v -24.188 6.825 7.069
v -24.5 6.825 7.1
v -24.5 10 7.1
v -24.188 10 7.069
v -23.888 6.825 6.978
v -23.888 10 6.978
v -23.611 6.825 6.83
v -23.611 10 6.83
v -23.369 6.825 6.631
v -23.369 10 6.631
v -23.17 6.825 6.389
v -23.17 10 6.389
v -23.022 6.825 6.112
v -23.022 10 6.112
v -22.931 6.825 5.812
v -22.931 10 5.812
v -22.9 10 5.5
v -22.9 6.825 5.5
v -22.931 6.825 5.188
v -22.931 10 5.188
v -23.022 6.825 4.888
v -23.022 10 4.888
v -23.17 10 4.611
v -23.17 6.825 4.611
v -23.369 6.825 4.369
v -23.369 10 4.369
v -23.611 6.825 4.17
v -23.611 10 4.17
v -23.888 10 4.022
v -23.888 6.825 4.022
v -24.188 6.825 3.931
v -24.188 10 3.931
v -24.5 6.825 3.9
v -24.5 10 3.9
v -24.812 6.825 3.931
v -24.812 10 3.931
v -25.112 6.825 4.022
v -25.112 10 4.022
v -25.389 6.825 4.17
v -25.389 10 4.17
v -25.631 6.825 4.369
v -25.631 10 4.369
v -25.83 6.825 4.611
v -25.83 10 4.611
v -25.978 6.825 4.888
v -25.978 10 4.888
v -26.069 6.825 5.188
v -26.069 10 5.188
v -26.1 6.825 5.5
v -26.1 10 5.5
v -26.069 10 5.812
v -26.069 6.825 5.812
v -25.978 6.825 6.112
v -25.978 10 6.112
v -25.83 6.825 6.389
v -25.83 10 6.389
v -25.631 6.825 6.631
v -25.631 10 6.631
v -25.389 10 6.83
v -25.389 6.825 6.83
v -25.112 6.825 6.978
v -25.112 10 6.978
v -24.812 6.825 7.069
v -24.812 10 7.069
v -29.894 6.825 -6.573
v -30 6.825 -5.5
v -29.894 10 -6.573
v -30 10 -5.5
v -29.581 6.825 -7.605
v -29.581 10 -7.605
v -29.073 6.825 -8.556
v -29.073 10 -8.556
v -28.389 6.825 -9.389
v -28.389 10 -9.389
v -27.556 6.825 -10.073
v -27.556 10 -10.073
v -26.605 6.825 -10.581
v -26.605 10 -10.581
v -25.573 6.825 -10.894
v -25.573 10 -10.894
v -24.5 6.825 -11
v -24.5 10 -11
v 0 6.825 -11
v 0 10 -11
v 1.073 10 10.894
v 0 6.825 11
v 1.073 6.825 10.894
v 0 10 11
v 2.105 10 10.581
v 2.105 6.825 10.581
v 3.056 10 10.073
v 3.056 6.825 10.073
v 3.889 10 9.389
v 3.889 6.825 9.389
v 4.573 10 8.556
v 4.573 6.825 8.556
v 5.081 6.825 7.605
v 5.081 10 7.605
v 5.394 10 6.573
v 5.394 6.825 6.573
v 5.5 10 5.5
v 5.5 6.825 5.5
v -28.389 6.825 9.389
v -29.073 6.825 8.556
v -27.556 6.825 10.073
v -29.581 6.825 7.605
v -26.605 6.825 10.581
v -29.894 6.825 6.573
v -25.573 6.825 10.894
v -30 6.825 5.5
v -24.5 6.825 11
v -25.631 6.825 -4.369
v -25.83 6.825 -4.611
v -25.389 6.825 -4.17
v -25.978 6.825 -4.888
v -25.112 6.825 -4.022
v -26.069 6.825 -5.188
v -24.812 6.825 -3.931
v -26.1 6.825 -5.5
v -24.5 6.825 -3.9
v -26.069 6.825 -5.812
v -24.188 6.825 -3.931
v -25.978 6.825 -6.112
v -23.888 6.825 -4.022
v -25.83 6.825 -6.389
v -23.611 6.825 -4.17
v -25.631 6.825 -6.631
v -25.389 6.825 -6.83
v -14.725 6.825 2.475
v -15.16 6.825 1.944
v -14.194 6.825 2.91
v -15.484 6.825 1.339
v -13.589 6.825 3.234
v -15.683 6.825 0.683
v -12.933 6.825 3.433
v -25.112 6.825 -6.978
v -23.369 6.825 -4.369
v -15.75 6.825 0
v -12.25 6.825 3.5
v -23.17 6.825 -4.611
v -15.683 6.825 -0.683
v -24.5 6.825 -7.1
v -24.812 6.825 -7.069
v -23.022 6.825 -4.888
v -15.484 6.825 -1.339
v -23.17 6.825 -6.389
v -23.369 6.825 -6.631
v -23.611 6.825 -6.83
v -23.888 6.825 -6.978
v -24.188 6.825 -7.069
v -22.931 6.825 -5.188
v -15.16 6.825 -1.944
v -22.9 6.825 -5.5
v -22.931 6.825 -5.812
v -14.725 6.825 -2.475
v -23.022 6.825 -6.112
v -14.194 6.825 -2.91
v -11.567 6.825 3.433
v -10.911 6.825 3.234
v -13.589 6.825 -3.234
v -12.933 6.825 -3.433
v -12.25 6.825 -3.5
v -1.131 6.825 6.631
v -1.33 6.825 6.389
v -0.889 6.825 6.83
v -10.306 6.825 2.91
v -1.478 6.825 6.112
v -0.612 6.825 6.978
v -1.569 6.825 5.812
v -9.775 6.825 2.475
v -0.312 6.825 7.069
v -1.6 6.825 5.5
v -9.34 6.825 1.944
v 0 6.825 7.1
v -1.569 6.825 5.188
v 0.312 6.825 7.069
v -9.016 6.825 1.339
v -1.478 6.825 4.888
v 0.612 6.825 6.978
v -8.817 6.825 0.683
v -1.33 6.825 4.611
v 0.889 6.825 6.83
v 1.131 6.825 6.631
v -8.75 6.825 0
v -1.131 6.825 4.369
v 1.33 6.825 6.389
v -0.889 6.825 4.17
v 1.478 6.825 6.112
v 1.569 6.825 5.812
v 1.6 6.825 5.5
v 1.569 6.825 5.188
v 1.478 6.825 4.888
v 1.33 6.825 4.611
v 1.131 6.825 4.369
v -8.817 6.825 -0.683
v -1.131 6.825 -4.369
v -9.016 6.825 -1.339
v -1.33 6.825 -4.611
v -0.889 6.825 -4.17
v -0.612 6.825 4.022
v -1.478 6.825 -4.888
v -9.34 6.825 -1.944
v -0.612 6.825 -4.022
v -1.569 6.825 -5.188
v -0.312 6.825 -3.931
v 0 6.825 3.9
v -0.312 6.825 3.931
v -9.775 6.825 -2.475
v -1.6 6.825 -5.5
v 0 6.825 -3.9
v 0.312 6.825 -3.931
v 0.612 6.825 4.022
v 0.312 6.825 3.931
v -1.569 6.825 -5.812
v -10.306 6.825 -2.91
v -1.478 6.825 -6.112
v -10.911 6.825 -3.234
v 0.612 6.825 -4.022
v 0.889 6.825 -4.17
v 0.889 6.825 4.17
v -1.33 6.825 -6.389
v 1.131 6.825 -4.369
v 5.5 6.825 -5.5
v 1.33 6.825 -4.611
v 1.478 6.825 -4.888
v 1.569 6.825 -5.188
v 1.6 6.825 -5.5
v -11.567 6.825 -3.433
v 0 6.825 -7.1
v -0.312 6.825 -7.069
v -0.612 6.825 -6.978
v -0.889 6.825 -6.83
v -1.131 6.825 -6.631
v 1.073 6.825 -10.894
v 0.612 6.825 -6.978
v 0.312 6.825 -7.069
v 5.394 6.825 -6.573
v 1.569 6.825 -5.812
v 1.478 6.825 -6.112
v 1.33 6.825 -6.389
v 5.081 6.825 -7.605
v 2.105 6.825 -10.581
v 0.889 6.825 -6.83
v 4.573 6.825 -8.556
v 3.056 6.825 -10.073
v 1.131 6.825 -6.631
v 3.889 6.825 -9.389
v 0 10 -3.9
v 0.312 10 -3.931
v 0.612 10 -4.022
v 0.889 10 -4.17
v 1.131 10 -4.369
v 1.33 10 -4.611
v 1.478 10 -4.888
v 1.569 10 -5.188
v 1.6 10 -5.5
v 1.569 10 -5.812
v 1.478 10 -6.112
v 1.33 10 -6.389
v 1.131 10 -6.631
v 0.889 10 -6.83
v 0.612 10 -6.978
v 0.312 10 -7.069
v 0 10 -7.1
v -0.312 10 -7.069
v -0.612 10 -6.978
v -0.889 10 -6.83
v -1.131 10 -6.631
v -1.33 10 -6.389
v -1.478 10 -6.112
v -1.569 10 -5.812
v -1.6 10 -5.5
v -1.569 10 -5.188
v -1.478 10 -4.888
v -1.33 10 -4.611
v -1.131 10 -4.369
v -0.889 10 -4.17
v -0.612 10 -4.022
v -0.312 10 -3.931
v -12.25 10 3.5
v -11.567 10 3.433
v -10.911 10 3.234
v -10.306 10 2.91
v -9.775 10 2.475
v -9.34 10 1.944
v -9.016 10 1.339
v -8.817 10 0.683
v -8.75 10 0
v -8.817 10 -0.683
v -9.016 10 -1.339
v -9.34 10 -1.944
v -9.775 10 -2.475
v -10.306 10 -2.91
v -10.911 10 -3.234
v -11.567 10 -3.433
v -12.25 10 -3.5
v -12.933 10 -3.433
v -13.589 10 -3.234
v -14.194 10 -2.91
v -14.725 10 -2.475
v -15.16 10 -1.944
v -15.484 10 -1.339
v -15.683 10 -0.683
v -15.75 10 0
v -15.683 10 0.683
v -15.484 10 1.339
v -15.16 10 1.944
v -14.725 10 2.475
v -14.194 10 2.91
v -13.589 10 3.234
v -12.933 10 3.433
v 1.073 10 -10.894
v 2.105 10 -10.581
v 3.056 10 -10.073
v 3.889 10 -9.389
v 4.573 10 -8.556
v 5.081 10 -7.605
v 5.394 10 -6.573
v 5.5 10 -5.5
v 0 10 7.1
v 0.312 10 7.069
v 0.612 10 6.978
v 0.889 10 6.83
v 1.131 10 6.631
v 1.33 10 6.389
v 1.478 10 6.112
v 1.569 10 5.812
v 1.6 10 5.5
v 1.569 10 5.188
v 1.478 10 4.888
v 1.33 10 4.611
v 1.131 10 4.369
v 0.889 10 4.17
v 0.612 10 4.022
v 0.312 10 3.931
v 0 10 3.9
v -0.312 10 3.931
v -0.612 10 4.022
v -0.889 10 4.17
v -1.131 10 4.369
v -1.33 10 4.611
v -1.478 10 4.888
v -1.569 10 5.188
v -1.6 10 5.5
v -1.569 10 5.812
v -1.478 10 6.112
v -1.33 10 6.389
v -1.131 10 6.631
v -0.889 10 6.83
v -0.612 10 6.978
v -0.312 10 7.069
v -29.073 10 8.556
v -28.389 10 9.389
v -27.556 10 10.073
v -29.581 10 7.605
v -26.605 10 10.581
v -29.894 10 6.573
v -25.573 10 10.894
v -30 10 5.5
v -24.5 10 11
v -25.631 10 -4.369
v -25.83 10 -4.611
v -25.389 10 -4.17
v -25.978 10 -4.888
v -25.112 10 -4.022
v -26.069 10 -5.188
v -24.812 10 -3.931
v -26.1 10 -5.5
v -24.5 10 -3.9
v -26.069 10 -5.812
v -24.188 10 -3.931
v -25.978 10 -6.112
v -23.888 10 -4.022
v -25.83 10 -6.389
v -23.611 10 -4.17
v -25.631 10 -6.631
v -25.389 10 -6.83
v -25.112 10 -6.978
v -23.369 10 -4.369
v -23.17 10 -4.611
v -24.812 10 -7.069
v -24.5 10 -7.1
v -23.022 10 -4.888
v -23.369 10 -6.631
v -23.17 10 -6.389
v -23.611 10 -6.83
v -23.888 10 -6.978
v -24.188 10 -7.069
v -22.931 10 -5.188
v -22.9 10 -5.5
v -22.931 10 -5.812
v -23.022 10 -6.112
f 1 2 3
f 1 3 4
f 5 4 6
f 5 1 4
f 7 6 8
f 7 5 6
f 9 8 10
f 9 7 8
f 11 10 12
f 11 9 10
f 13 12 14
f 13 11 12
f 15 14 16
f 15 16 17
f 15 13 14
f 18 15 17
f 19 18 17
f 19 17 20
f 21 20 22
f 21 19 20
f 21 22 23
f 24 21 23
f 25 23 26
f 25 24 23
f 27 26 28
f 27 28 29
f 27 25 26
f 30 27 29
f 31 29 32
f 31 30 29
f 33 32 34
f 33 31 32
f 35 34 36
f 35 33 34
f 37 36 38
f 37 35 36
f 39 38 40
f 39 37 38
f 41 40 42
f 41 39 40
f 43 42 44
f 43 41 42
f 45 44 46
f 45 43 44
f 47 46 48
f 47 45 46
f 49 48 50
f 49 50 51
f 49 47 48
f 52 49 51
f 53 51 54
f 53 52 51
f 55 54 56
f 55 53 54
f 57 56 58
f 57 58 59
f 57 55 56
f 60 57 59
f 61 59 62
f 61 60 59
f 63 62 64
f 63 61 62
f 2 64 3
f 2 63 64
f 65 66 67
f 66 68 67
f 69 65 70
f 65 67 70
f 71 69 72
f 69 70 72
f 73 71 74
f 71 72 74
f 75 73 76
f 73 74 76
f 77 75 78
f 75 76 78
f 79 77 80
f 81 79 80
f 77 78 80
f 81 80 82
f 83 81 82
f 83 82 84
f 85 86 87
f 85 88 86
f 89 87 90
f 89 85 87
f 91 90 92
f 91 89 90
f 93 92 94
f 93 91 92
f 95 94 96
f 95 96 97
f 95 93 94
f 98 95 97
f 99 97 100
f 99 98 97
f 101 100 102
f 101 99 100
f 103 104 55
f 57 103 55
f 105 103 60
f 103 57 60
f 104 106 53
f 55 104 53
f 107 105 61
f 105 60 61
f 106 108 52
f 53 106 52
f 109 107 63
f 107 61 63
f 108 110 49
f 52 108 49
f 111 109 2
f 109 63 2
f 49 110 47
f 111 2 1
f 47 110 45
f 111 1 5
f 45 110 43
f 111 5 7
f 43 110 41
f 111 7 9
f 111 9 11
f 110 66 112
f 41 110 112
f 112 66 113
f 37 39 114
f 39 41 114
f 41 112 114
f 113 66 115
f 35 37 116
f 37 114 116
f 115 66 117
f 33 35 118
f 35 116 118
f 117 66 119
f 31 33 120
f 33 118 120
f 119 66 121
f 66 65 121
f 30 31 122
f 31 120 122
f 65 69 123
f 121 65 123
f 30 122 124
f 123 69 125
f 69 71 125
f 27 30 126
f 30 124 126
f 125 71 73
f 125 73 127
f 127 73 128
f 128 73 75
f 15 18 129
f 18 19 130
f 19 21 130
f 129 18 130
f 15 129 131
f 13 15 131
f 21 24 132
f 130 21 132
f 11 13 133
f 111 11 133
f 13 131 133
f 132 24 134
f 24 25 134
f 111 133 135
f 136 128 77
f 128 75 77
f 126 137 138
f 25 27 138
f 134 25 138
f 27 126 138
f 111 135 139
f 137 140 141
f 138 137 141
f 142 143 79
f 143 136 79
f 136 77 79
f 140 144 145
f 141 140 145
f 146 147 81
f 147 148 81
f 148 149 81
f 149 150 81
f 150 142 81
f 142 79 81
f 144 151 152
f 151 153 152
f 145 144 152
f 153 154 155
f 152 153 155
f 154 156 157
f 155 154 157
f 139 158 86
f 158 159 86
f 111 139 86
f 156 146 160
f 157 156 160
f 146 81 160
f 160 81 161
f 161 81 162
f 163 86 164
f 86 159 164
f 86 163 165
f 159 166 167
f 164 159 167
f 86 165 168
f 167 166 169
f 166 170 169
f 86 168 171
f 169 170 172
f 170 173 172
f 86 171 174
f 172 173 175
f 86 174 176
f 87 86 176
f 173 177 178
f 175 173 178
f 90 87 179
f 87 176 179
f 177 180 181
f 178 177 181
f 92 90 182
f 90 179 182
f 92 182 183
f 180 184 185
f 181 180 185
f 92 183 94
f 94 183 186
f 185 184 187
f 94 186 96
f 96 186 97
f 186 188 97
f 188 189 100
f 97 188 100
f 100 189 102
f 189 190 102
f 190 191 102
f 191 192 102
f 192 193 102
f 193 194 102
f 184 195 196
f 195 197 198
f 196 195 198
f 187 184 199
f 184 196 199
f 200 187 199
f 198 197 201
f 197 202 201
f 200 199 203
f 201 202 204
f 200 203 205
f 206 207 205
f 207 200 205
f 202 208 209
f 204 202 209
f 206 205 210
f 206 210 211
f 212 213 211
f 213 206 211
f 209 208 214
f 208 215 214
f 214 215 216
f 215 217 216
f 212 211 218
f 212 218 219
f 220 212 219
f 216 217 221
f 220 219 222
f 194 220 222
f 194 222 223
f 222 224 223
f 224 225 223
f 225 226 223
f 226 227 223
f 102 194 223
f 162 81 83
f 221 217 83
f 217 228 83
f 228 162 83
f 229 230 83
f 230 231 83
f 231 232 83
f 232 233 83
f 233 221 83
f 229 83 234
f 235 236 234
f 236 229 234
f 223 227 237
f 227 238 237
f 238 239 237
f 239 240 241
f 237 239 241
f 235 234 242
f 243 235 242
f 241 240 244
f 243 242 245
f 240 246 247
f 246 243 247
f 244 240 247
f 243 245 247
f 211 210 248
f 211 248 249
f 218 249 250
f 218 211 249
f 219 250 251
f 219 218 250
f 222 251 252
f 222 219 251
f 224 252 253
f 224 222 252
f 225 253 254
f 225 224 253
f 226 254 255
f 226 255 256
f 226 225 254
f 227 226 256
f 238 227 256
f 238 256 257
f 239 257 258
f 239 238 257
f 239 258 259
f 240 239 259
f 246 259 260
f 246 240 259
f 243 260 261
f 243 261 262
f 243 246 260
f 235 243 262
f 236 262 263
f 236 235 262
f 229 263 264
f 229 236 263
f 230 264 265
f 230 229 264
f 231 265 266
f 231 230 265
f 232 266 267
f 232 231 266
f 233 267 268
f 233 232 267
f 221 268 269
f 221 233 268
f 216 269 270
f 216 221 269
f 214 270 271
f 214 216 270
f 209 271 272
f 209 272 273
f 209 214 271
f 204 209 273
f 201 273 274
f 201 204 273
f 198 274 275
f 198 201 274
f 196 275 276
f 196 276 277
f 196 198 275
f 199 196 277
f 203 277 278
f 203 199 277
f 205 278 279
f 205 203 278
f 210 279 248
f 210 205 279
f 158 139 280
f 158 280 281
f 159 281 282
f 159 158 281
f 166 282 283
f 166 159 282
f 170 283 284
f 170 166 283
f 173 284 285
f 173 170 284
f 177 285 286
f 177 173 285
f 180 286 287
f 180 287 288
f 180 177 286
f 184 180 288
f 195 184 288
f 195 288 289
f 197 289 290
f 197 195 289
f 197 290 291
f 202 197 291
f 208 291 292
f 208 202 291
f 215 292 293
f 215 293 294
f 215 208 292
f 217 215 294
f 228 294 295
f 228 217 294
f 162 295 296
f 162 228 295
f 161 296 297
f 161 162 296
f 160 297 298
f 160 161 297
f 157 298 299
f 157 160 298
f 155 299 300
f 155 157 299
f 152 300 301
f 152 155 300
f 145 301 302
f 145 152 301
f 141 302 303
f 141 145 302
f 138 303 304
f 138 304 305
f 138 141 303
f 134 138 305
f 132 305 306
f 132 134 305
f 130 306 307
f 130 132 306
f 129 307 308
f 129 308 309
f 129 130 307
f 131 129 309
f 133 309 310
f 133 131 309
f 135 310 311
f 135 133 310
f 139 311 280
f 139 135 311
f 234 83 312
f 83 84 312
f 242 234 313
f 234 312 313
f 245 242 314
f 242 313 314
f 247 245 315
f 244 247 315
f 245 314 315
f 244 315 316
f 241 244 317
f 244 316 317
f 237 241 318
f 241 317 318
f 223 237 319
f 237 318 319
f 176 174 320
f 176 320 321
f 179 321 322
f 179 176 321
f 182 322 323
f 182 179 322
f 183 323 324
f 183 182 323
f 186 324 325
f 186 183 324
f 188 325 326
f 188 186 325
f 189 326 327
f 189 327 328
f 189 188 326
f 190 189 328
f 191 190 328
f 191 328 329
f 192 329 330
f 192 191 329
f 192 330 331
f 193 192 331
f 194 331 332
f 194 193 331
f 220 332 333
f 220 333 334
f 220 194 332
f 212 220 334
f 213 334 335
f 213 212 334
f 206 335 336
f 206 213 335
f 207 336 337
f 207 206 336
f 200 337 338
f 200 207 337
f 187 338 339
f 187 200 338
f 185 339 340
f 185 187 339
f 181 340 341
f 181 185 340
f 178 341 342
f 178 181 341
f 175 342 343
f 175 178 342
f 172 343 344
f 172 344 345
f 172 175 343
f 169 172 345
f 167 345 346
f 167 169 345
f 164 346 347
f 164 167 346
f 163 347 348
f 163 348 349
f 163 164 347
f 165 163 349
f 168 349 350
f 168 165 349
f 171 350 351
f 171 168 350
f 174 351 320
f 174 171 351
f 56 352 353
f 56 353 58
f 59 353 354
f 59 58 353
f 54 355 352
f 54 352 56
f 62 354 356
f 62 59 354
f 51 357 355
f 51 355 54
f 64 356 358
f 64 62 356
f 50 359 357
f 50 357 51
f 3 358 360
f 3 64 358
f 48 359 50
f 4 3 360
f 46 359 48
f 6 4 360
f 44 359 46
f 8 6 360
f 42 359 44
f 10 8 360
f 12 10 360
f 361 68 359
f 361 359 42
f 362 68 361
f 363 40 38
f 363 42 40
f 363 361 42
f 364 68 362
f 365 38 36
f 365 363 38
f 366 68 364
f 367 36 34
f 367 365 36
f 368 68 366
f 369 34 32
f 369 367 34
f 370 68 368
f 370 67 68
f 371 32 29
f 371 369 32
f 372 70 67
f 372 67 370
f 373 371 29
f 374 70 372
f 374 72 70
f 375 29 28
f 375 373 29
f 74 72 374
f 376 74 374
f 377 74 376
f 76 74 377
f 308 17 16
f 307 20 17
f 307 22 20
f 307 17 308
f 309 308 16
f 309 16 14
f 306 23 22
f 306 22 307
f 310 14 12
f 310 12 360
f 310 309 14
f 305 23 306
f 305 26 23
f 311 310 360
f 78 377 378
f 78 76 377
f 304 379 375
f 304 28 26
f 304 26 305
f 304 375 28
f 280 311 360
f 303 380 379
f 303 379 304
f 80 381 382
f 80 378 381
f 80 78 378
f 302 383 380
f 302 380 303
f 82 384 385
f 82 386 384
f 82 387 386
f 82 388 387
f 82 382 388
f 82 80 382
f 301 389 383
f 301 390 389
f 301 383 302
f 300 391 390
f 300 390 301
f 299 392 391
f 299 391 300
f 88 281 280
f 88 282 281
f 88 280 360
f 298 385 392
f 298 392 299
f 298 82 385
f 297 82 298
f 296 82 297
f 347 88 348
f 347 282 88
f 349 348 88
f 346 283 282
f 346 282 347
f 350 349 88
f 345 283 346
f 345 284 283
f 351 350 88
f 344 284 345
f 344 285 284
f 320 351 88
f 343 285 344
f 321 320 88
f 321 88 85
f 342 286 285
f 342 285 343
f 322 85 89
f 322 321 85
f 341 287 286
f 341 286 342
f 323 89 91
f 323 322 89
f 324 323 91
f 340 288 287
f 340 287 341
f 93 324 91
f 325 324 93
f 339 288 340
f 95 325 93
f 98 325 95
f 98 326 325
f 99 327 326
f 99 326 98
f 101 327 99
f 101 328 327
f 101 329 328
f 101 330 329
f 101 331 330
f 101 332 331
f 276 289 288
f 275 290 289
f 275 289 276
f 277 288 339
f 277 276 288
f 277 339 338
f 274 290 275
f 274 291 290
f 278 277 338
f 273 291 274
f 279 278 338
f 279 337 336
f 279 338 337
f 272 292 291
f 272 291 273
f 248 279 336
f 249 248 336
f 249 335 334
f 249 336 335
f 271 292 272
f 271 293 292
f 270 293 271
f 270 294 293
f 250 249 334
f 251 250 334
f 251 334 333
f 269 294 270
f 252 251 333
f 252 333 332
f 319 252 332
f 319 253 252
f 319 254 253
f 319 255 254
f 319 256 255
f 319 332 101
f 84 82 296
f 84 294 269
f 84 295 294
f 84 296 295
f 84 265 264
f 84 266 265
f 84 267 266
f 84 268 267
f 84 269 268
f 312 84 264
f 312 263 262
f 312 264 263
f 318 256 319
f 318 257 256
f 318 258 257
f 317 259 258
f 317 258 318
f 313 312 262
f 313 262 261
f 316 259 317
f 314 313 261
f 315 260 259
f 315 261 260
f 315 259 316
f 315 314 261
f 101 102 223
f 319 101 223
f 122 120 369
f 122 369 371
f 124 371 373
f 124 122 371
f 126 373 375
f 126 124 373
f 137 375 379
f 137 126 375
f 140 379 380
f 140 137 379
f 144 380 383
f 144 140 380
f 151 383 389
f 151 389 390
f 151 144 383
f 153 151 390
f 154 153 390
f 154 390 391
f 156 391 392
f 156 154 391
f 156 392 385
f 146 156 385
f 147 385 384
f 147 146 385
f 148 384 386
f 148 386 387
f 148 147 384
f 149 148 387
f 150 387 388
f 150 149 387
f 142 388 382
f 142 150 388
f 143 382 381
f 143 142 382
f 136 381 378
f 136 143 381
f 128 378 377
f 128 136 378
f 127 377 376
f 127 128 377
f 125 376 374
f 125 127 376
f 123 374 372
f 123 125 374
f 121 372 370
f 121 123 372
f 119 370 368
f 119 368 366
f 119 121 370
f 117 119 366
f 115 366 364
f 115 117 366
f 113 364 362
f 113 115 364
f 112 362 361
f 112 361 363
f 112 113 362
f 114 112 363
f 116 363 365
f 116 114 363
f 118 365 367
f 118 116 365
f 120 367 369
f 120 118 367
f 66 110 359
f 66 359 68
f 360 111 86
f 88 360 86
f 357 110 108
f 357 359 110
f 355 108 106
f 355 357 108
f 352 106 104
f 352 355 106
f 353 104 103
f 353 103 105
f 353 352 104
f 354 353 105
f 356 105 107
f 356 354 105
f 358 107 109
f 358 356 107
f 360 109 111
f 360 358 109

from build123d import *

# Parameters (mm, degrees)
SKETCH2_W             = 22
SKETCH2_H             = 17.825
SKETCH2_R             = 2.85
BOSS_EXTRUDE1_DEPTH   = 5.5
FILLET1_R             = 10
FILLET2_R             = 5.5
SKETCH4_R             = 2.55
CUT_EXTRUDE1_DEPTH    = 5.5
CHAMFER1_SIZE         = 0.4
CHAMFER1_SIZE2        = 1.098990968
CHAMFER4_SIZE         = 0.4
CHAMFER5_SIZE         = 0.4
CHAMFER5_SIZE2        = 1.098990968
BODY_MOVE_COPY1_ANGLE = 180
SKETCH5_W             = 35.5
SKETCH5_H             = 22
SKETCH5_R             = 1.6
SKETCH5_R_2           = 3.5
BOSS_EXTRUDE2_DEPTH   = 3.175
FILLET3_R             = 5.5


with BuildPart() as part:
    # Sketch2 → Boss-Extrude1 (new, symmetric)
    with BuildSketch(Plane(origin=(0, 0, 0), x_dir=(0, 0, -1), z_dir=(1, 0, 0))):
        with Locations((0, -2.0875)):
            Rectangle(SKETCH2_W, SKETCH2_H)
        Circle(SKETCH2_R, mode=Mode.SUBTRACT)
    extrude(amount=BOSS_EXTRUDE1_DEPTH, both=True)

    # Fillet1
    fillet1_edges = [part.edges().sort_by_distance(p)[0] for p in [
        (0, -11, -11),
        (0, -11, 11),
    ]]
    fillet(fillet1_edges, radius=FILLET1_R)

    # Fillet2
    fillet2_edges = [part.edges().sort_by_distance(p)[0] for p in [
        (-5.5, 2.9125, -11),
        (-5.5, -8.071067812, -8.071067812),
        (-5.5, -8.071067812, 8.071067812),
        (5.5, 2.9125, -11),
        (5.5, -8.071067812, -8.071067812),
        (5.5, -8.071067812, 8.071067812),
        (-5.5, 2.9125, 11),
        (5.5, 2.9125, 11),
        (-5.5, -11, 0),
        (5.5, -11, 0),
    ]]
    fillet(fillet2_edges, radius=FILLET2_R - 0.0001)  # a hair under: the kernel refuses the full size

    # Sketch4 → Cut-Extrude1 (cut)
    with BuildSketch(Plane(origin=(0, 6.825, 0), x_dir=(1, 0, 0), z_dir=(0, 1, 0))):
        with Locations(Location((0, 5.5, 0), (0, 0, 270))):
            Circle(SKETCH4_R)
        with Locations(Location((0, -5.5, 0), (0, 0, 270))):
            Circle(SKETCH4_R)
    extrude(amount=-CUT_EXTRUDE1_DEPTH, mode=Mode.SUBTRACT)

    # Chamfer1
    chamfer1_edges = [part.edges().sort_by_distance(p)[0] for p in [
        (-5.5, 0, 2.85),
    ]]
    chamfer1_side = [part.faces().sort_by_distance(p)[0] for p in [
        (-5.5, 6.659799367, 0),
    ]]
    chamfer(chamfer1_edges, length=CHAMFER1_SIZE, length2=CHAMFER1_SIZE2, reference=chamfer1_side[0])

    # Chamfer4
    chamfer4_edges = [part.edges().sort_by_distance(p)[0] for p in [
        (-5.5, 6.825, 0),
        (5.5, 6.825, 0),
        (3.889116586, 6.825, 9.389116586),
        (-3.889116586, 6.825, 9.389116586),
        (3.889116586, 6.825, -9.389116586),
        (-3.889116586, 6.825, -9.389116586),
    ]]
    chamfer(chamfer4_edges, length=CHAMFER4_SIZE)

    # Chamfer5
    chamfer5_edges = [part.edges().sort_by_distance(p)[0] for p in [
        (0, 6.825, -8.05),
        (0, 6.825, 2.95),
    ]]
    chamfer5_side = [part.faces().sort_by_distance(p)[0] for p in [
        (0, 6.825, 0),
    ]]
    chamfer(chamfer5_edges, length=CHAMFER5_SIZE, length2=CHAMFER5_SIZE2, reference=chamfer5_side[0])


with BuildPart() as body_2:
    # Body-Move/Copy1: copy of part
    add(part.part.rotate(Axis((0, 0, 0), (0, 1, 0)), BODY_MOVE_COPY1_ANGLE))


with BuildPart() as part_1:
    # Body-Move/Copy3: read off the stored shape, not the designer's step
    # Body-Move/Copy3: moved
    add(part.part.moved(Location((-24.5, 0, 0))))


with BuildPart() as body_3:
    # Sketch5 → Boss-Extrude2 (new body)
    with BuildSketch(Plane(origin=(0, 6.825, 0), x_dir=(1, 0, 0), z_dir=(0, 1, 0))):
        with Locations((-12.25, 0)):
            Rectangle(SKETCH5_W, SKETCH5_H)
        with Locations(Location((-24.5, 5.5, 0), (0, 0, 270))):
            Circle(SKETCH5_R, mode=Mode.SUBTRACT)
        with Locations(Location((0, -5.5, 0), (0, 0, 270))):
            Circle(SKETCH5_R, mode=Mode.SUBTRACT)
        with Locations(Location((0, 5.5, 0), (0, 0, 270))):
            Circle(SKETCH5_R, mode=Mode.SUBTRACT)
        with Locations(Location((-24.5, -5.5, 0), (0, 0, 270))):
            Circle(SKETCH5_R, mode=Mode.SUBTRACT)
        with Locations(Location((-12.25, 0, 0), (0, 0, 270))):
            Circle(SKETCH5_R_2, mode=Mode.SUBTRACT)
    extrude(amount=BOSS_EXTRUDE2_DEPTH)

    # Fillet3
    fillet3_edges = [body_3.edges().sort_by_distance(p)[0] for p in [
        (5.5, 8.4125, 11),
        (-30, 8.4125, 11),
        (-30, 8.4125, -11),
        (5.5, 8.4125, -11),
    ]]
    fillet(fillet3_edges, radius=FILLET3_R)


solid = body_3.part
